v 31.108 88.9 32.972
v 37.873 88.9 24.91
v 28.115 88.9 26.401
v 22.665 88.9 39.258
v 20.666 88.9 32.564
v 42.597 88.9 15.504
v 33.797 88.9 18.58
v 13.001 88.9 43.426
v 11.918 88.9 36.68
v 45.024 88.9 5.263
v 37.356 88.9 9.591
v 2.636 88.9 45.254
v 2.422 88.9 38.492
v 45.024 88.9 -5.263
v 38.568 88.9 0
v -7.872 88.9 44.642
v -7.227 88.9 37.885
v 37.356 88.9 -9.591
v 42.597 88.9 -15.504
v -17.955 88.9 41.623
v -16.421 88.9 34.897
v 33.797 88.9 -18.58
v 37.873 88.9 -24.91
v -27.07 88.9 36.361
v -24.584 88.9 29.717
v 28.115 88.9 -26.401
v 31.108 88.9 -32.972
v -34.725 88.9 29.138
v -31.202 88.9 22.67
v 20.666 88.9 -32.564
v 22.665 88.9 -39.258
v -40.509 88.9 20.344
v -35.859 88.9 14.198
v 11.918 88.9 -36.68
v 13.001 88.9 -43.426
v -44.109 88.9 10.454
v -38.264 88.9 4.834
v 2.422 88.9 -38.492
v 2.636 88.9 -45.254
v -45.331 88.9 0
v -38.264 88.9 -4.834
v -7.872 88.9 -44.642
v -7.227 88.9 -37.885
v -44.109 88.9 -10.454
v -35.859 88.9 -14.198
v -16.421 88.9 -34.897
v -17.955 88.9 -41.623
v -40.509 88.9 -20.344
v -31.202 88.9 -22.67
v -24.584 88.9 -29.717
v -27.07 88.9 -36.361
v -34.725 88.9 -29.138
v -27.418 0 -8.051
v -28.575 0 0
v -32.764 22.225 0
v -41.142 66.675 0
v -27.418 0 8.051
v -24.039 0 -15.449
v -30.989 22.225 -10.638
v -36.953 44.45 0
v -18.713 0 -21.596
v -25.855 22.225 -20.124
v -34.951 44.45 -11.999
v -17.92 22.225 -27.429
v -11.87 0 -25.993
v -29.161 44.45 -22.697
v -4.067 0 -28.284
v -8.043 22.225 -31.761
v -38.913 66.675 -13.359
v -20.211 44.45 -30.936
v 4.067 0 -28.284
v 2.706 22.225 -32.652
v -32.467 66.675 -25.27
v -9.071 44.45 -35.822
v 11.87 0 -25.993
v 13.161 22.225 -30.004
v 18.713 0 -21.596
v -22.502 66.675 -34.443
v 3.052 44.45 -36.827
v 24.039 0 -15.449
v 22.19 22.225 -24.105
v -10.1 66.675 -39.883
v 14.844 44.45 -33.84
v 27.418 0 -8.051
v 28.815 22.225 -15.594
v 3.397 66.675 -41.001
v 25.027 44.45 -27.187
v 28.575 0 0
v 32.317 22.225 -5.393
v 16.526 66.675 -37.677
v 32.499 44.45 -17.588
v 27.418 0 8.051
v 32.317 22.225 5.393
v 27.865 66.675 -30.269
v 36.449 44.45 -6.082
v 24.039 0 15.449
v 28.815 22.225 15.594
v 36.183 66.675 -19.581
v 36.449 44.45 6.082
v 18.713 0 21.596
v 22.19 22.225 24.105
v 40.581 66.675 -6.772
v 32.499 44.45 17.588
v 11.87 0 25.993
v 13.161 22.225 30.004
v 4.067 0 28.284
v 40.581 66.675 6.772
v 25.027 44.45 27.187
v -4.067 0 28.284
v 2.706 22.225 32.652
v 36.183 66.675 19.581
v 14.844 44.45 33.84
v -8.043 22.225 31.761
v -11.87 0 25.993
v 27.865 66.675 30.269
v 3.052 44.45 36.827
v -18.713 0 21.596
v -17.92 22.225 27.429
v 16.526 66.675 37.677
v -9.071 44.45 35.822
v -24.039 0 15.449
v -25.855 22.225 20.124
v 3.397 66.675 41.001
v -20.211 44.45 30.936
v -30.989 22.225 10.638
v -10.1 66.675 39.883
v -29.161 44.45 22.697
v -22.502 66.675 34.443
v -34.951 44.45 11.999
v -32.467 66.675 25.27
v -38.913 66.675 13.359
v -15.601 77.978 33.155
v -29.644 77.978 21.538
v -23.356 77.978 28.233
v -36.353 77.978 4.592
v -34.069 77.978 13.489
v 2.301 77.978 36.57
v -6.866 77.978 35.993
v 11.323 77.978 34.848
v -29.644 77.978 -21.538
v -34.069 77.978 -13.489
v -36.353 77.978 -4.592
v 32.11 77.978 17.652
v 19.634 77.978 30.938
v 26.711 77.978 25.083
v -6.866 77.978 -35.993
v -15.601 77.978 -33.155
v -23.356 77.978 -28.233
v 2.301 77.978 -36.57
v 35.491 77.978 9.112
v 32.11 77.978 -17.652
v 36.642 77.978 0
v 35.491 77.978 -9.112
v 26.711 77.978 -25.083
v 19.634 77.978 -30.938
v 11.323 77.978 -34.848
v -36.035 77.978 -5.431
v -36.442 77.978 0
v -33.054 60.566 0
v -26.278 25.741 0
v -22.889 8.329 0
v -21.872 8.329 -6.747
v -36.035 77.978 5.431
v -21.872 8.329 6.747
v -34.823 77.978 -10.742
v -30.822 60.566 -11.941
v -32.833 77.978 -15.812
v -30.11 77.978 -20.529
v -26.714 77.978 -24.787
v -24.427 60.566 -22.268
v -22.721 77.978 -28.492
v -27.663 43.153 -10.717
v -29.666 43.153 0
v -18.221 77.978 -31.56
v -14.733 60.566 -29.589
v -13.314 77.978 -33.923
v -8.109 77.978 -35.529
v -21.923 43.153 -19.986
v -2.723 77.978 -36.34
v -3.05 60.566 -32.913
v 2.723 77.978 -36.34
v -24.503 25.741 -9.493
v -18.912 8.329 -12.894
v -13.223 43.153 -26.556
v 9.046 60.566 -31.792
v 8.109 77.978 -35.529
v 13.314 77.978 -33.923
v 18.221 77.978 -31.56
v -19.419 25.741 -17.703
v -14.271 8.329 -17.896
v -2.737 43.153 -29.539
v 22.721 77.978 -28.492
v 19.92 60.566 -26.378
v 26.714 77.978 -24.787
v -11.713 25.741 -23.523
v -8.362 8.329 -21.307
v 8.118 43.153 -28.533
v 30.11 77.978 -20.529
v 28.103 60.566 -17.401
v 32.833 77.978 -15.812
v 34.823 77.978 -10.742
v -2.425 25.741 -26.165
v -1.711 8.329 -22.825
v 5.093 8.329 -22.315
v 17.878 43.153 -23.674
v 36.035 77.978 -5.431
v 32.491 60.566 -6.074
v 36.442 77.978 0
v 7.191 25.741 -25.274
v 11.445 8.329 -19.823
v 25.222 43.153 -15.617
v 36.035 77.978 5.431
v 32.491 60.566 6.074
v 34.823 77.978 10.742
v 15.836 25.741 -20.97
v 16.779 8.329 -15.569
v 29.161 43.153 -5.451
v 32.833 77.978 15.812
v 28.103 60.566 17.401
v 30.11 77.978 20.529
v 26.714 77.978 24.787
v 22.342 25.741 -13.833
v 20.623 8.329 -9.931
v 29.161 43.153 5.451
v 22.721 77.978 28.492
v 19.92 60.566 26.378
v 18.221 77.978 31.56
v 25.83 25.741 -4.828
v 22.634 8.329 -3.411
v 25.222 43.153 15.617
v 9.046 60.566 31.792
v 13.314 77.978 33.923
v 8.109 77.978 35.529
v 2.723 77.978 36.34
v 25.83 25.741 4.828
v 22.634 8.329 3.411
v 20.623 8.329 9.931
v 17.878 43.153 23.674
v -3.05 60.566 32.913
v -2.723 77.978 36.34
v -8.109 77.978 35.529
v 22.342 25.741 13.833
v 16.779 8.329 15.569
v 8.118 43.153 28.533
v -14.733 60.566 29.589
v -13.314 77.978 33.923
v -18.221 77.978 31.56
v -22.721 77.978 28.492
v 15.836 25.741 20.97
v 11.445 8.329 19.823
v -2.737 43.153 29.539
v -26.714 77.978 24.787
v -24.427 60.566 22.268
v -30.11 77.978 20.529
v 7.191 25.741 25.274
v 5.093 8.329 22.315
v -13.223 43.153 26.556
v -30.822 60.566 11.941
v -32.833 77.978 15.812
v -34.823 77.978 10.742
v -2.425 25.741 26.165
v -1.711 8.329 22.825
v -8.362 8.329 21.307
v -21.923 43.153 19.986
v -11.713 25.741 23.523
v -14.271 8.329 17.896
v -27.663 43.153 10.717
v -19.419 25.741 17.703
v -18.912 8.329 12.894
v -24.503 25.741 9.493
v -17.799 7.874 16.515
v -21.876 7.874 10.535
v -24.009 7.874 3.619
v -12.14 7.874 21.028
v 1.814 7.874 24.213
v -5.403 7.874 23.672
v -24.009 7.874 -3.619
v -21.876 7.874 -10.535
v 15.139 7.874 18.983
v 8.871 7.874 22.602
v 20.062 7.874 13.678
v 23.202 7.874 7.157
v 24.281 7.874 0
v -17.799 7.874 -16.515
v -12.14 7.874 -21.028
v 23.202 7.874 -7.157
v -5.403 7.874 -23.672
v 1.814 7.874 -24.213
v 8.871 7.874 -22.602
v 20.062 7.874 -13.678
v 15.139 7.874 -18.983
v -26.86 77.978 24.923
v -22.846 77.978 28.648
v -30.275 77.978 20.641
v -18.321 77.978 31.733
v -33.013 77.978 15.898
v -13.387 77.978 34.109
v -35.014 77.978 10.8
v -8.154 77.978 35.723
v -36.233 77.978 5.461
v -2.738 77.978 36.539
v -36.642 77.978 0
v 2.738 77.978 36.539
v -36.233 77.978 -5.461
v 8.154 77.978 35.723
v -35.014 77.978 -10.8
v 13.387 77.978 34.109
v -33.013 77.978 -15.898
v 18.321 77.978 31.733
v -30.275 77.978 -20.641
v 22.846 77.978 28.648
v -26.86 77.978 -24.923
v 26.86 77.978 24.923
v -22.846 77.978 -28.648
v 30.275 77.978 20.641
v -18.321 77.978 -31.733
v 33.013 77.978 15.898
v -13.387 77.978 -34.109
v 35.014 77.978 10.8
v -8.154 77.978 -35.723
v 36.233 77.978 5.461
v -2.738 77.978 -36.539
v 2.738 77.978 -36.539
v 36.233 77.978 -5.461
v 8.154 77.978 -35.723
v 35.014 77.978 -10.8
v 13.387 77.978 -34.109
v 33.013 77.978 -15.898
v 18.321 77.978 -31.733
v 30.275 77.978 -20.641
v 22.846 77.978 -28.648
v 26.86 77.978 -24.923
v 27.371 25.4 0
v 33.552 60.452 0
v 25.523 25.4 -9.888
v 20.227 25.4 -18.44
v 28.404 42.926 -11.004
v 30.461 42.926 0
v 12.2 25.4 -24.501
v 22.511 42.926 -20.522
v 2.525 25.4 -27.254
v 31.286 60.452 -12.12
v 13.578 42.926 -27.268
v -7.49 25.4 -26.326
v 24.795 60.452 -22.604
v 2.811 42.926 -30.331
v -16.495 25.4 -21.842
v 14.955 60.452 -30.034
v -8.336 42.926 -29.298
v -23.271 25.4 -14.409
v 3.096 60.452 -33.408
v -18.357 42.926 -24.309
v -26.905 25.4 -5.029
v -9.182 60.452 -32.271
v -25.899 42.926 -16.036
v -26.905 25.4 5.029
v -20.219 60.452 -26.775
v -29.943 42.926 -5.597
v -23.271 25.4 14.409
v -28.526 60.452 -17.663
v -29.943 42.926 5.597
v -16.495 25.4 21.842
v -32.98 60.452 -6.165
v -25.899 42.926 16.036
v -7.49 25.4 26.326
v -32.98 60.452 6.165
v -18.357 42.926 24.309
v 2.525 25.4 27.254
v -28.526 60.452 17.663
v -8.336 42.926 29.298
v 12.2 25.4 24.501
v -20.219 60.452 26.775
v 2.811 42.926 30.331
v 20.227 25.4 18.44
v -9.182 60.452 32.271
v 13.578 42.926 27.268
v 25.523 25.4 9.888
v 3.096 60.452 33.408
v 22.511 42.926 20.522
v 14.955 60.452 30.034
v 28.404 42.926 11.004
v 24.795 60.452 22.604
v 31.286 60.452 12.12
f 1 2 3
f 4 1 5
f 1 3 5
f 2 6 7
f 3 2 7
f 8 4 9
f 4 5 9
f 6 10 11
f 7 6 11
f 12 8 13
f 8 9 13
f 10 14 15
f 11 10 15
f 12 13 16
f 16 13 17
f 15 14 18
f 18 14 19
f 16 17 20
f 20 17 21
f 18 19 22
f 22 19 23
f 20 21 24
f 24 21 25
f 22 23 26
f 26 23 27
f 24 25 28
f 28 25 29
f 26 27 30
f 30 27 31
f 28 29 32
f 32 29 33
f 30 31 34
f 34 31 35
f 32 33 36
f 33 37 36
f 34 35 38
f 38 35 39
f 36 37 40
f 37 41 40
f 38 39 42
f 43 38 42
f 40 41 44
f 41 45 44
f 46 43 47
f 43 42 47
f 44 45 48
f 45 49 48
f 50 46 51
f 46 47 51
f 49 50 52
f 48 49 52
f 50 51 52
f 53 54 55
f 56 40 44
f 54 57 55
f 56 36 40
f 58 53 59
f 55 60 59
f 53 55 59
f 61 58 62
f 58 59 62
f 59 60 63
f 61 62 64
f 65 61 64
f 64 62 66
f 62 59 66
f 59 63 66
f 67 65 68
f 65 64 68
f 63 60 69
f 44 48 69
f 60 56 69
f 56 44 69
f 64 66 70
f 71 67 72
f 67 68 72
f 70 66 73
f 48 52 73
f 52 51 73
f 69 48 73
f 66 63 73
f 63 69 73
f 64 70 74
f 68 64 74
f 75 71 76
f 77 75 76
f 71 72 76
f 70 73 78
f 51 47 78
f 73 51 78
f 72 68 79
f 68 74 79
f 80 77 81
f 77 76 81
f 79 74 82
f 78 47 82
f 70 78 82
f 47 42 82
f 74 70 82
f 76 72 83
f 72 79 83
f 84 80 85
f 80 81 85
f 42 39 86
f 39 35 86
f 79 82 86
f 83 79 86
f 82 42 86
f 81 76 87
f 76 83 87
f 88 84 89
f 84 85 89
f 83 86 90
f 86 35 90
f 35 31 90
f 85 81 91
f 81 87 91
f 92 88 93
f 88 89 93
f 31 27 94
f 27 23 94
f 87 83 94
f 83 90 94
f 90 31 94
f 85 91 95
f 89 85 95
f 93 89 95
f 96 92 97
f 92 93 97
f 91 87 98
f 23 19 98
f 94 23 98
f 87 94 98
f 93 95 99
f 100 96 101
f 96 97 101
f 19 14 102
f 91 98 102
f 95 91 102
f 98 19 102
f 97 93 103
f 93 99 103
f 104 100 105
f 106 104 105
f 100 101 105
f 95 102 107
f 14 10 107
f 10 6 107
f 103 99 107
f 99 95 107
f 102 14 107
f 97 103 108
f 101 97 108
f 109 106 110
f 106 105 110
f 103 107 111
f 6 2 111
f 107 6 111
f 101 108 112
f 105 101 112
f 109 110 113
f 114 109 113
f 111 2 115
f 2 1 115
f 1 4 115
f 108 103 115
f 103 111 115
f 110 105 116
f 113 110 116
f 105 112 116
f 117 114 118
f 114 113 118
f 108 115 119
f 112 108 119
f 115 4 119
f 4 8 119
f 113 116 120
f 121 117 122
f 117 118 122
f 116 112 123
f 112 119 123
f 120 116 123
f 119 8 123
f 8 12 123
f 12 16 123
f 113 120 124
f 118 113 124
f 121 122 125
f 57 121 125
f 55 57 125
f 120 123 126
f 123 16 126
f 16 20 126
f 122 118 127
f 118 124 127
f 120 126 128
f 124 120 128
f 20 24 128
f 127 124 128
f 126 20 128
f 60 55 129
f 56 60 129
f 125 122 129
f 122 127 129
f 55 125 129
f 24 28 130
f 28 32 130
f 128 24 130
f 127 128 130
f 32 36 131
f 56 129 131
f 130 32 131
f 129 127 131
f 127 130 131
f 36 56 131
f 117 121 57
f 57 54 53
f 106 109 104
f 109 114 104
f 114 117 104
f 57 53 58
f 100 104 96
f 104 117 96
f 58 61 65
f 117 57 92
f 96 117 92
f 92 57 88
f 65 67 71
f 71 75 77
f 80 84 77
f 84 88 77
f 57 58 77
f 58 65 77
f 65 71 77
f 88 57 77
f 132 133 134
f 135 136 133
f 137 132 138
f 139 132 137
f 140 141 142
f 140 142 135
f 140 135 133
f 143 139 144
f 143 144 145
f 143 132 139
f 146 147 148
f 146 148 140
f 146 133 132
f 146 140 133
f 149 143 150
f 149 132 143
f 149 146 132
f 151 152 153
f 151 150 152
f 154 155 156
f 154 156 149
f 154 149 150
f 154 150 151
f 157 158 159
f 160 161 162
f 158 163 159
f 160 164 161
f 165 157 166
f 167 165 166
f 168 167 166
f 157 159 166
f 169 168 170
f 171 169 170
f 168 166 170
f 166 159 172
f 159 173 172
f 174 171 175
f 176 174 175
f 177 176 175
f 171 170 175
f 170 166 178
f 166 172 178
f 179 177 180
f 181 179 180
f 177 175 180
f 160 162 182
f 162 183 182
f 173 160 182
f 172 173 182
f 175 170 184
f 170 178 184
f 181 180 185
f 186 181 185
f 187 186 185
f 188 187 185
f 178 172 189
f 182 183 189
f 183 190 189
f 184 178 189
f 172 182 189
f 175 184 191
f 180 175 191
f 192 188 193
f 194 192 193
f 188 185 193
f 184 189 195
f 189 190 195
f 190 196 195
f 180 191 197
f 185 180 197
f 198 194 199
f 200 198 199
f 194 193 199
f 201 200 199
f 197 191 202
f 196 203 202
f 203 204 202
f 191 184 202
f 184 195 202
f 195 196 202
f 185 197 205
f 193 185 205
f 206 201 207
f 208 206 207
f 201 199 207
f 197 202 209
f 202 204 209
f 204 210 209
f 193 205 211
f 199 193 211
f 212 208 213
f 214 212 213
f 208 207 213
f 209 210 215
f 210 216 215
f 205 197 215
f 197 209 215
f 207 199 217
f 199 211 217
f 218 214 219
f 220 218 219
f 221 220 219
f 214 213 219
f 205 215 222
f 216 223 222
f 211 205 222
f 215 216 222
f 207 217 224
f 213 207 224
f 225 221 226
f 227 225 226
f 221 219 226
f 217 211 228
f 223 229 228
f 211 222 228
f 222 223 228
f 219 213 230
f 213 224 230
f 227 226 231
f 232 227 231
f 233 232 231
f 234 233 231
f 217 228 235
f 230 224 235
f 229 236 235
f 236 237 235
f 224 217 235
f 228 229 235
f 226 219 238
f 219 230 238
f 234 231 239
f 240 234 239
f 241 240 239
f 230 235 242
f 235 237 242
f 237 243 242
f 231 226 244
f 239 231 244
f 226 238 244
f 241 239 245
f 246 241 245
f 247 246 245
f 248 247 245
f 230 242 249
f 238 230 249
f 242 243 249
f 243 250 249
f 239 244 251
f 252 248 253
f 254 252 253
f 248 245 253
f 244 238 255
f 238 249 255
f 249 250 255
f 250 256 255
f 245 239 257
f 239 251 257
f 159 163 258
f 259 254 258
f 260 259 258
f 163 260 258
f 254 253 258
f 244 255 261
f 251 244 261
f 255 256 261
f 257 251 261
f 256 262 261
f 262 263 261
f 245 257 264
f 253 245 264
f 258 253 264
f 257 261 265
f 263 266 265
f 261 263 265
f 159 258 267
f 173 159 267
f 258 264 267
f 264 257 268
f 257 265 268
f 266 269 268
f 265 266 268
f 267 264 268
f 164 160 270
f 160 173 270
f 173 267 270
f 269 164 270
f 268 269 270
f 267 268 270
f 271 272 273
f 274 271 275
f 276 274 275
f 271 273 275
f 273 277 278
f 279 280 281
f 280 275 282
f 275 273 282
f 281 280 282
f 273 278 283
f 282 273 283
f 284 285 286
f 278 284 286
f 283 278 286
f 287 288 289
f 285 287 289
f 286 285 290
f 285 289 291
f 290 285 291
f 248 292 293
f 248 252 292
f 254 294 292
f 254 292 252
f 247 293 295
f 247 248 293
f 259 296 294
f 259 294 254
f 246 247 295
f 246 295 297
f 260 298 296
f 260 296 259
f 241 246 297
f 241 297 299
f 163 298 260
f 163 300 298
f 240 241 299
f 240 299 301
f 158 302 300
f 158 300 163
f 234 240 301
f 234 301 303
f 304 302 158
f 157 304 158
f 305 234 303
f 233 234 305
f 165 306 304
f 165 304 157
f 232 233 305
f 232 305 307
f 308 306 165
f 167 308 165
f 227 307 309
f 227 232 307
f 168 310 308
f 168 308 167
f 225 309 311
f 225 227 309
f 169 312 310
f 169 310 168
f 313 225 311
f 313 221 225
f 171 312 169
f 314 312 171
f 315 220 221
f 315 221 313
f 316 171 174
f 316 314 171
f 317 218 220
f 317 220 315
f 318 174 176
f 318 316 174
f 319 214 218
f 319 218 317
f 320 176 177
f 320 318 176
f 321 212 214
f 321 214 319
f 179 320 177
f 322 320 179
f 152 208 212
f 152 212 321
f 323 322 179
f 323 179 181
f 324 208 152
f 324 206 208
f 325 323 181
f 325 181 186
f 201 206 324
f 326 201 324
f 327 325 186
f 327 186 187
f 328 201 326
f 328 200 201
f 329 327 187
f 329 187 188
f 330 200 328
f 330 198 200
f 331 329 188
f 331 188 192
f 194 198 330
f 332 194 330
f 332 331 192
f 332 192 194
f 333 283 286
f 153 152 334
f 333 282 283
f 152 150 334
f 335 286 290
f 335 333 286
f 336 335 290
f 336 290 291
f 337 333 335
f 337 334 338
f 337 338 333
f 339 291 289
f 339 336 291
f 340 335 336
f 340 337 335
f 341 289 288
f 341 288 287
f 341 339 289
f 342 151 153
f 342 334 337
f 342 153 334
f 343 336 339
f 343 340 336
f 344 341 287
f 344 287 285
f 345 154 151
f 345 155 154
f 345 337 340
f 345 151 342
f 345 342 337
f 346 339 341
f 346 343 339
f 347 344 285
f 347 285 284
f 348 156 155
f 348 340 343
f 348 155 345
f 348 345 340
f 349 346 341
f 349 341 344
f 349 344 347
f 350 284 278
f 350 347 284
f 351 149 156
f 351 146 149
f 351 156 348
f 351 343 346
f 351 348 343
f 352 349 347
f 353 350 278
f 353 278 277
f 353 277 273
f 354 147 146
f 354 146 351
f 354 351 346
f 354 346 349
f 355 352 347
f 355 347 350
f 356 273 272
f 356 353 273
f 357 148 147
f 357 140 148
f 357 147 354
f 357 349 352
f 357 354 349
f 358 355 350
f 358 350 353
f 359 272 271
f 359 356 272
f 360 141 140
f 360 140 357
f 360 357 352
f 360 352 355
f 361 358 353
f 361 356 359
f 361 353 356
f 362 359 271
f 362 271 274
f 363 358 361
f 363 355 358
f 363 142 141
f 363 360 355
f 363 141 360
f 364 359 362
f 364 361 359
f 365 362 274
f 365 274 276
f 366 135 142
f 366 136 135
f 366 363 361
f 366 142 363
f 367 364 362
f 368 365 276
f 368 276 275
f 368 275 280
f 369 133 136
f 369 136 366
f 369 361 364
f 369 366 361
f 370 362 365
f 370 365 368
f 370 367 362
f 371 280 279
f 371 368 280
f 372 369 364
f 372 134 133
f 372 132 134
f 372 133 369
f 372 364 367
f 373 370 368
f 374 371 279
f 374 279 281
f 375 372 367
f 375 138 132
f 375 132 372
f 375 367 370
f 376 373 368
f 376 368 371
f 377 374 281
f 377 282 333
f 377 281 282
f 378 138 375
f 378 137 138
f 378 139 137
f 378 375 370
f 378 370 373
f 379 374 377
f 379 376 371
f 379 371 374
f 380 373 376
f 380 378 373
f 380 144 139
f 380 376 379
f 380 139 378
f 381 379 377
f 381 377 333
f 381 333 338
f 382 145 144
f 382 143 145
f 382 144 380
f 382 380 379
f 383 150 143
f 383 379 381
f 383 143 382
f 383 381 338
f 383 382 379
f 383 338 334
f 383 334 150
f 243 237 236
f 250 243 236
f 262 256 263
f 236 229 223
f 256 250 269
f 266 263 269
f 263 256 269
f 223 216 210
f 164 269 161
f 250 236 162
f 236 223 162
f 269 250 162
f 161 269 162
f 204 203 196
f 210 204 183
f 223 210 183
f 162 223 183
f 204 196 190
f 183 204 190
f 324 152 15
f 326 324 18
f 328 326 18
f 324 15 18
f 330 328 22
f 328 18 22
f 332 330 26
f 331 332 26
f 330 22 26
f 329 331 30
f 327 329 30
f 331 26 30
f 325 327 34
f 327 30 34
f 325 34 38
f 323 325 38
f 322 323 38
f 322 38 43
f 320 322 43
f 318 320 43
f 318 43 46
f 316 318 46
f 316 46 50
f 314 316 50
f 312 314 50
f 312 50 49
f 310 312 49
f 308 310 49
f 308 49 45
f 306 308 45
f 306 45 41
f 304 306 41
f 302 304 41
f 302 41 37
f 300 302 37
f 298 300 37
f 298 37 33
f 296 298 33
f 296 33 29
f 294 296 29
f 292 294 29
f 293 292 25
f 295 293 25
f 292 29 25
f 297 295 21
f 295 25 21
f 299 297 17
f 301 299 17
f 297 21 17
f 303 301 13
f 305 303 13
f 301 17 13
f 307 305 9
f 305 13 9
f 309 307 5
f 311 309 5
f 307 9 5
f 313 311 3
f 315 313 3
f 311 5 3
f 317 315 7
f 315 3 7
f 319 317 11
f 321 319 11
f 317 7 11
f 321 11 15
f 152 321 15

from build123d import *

# Parameters (mm, degrees)
SKETCH3_R           = 38.567705457
BOSS_EXTRUDE2_DEPTH = 81.026
BOSS_EXTRUDE2_DRAFT = -10
SKETCH5_R           = 38.567705457
CUT_EXTRUDE3_DEPTH  = 10.922
CUT_EXTRUDE3_DRAFT  = -10


with BuildPart() as part:
    # Sketch1 → Revolve2 (revolve)
    with BuildSketch(Plane.XY, mode=Mode.PRIVATE) as revolve2_sk:
        Polygon((0, 0), (28.575, 0), (45.330735358, 88.9), (38.567705457, 88.9), (22.889249359, 8.32891688), (0, 8.32891688), align=None)
    revolve(revolve2_sk.sketch.rotate(Axis((0, 8.32891688, 0), (0, -1, 0)), 180), axis=Axis((0, 8.32891688, 0), (0, -1, 0)))


with BuildPart() as body_2:
    # Sketch3 → Boss-Extrude2 (with draft: the straight prism first)
    with BuildSketch(Plane(origin=(0, 88.9, 0), x_dir=(1, 0, 0), z_dir=(0, 1, 0))):
        Circle(SKETCH3_R)
    extrude(amount=-BOSS_EXTRUDE2_DEPTH)
    # Boss-Extrude2: the draft: its side faces are tilted about the plane it starts from
    boss_extrude2_sides = [body_2.faces().sort_by_distance(p)[0] for p in [
        (-38.567705457, 48.387, 0),
    ]]
    draft(boss_extrude2_sides, Plane(origin=(0, 88.9, 0), x_dir=(1, 0, 0), z_dir=(0, 1, 0)), BOSS_EXTRUDE2_DRAFT)


with BuildPart() as cut_extrude3_tool:
    # Sketch5 → Cut-Extrude3 (with draft: the straight prism first)
    with BuildSketch(Plane(origin=(0, 88.9, 0), x_dir=(1, 0, 0), z_dir=(0, 1, 0))):
        Circle(SKETCH5_R)
    extrude(amount=-CUT_EXTRUDE3_DEPTH)
    # Cut-Extrude3: the draft: its side faces are tilted about the plane it starts from
    cut_extrude3_sides = [cut_extrude3_tool.faces().sort_by_distance(p)[0] for p in [
        (-38.567705457, 83.439, 0),
    ]]
    draft(cut_extrude3_sides, Plane(origin=(0, 88.9, 0), x_dir=(1, 0, 0), z_dir=(0, 1, 0)), CUT_EXTRUDE3_DRAFT)


with BuildPart() as part_1:
    add(part.part)

    # Cut-Extrude3: cut by cut_extrude3_tool
    add(cut_extrude3_tool.part, mode=Mode.SUBTRACT)


with BuildPart() as body_2_1:
    add(body_2.part)

    # Cut-Extrude3: cut by cut_extrude3_tool
    add(cut_extrude3_tool.part, mode=Mode.SUBTRACT)


solid = Compound([part_1.part, body_2_1.part])
